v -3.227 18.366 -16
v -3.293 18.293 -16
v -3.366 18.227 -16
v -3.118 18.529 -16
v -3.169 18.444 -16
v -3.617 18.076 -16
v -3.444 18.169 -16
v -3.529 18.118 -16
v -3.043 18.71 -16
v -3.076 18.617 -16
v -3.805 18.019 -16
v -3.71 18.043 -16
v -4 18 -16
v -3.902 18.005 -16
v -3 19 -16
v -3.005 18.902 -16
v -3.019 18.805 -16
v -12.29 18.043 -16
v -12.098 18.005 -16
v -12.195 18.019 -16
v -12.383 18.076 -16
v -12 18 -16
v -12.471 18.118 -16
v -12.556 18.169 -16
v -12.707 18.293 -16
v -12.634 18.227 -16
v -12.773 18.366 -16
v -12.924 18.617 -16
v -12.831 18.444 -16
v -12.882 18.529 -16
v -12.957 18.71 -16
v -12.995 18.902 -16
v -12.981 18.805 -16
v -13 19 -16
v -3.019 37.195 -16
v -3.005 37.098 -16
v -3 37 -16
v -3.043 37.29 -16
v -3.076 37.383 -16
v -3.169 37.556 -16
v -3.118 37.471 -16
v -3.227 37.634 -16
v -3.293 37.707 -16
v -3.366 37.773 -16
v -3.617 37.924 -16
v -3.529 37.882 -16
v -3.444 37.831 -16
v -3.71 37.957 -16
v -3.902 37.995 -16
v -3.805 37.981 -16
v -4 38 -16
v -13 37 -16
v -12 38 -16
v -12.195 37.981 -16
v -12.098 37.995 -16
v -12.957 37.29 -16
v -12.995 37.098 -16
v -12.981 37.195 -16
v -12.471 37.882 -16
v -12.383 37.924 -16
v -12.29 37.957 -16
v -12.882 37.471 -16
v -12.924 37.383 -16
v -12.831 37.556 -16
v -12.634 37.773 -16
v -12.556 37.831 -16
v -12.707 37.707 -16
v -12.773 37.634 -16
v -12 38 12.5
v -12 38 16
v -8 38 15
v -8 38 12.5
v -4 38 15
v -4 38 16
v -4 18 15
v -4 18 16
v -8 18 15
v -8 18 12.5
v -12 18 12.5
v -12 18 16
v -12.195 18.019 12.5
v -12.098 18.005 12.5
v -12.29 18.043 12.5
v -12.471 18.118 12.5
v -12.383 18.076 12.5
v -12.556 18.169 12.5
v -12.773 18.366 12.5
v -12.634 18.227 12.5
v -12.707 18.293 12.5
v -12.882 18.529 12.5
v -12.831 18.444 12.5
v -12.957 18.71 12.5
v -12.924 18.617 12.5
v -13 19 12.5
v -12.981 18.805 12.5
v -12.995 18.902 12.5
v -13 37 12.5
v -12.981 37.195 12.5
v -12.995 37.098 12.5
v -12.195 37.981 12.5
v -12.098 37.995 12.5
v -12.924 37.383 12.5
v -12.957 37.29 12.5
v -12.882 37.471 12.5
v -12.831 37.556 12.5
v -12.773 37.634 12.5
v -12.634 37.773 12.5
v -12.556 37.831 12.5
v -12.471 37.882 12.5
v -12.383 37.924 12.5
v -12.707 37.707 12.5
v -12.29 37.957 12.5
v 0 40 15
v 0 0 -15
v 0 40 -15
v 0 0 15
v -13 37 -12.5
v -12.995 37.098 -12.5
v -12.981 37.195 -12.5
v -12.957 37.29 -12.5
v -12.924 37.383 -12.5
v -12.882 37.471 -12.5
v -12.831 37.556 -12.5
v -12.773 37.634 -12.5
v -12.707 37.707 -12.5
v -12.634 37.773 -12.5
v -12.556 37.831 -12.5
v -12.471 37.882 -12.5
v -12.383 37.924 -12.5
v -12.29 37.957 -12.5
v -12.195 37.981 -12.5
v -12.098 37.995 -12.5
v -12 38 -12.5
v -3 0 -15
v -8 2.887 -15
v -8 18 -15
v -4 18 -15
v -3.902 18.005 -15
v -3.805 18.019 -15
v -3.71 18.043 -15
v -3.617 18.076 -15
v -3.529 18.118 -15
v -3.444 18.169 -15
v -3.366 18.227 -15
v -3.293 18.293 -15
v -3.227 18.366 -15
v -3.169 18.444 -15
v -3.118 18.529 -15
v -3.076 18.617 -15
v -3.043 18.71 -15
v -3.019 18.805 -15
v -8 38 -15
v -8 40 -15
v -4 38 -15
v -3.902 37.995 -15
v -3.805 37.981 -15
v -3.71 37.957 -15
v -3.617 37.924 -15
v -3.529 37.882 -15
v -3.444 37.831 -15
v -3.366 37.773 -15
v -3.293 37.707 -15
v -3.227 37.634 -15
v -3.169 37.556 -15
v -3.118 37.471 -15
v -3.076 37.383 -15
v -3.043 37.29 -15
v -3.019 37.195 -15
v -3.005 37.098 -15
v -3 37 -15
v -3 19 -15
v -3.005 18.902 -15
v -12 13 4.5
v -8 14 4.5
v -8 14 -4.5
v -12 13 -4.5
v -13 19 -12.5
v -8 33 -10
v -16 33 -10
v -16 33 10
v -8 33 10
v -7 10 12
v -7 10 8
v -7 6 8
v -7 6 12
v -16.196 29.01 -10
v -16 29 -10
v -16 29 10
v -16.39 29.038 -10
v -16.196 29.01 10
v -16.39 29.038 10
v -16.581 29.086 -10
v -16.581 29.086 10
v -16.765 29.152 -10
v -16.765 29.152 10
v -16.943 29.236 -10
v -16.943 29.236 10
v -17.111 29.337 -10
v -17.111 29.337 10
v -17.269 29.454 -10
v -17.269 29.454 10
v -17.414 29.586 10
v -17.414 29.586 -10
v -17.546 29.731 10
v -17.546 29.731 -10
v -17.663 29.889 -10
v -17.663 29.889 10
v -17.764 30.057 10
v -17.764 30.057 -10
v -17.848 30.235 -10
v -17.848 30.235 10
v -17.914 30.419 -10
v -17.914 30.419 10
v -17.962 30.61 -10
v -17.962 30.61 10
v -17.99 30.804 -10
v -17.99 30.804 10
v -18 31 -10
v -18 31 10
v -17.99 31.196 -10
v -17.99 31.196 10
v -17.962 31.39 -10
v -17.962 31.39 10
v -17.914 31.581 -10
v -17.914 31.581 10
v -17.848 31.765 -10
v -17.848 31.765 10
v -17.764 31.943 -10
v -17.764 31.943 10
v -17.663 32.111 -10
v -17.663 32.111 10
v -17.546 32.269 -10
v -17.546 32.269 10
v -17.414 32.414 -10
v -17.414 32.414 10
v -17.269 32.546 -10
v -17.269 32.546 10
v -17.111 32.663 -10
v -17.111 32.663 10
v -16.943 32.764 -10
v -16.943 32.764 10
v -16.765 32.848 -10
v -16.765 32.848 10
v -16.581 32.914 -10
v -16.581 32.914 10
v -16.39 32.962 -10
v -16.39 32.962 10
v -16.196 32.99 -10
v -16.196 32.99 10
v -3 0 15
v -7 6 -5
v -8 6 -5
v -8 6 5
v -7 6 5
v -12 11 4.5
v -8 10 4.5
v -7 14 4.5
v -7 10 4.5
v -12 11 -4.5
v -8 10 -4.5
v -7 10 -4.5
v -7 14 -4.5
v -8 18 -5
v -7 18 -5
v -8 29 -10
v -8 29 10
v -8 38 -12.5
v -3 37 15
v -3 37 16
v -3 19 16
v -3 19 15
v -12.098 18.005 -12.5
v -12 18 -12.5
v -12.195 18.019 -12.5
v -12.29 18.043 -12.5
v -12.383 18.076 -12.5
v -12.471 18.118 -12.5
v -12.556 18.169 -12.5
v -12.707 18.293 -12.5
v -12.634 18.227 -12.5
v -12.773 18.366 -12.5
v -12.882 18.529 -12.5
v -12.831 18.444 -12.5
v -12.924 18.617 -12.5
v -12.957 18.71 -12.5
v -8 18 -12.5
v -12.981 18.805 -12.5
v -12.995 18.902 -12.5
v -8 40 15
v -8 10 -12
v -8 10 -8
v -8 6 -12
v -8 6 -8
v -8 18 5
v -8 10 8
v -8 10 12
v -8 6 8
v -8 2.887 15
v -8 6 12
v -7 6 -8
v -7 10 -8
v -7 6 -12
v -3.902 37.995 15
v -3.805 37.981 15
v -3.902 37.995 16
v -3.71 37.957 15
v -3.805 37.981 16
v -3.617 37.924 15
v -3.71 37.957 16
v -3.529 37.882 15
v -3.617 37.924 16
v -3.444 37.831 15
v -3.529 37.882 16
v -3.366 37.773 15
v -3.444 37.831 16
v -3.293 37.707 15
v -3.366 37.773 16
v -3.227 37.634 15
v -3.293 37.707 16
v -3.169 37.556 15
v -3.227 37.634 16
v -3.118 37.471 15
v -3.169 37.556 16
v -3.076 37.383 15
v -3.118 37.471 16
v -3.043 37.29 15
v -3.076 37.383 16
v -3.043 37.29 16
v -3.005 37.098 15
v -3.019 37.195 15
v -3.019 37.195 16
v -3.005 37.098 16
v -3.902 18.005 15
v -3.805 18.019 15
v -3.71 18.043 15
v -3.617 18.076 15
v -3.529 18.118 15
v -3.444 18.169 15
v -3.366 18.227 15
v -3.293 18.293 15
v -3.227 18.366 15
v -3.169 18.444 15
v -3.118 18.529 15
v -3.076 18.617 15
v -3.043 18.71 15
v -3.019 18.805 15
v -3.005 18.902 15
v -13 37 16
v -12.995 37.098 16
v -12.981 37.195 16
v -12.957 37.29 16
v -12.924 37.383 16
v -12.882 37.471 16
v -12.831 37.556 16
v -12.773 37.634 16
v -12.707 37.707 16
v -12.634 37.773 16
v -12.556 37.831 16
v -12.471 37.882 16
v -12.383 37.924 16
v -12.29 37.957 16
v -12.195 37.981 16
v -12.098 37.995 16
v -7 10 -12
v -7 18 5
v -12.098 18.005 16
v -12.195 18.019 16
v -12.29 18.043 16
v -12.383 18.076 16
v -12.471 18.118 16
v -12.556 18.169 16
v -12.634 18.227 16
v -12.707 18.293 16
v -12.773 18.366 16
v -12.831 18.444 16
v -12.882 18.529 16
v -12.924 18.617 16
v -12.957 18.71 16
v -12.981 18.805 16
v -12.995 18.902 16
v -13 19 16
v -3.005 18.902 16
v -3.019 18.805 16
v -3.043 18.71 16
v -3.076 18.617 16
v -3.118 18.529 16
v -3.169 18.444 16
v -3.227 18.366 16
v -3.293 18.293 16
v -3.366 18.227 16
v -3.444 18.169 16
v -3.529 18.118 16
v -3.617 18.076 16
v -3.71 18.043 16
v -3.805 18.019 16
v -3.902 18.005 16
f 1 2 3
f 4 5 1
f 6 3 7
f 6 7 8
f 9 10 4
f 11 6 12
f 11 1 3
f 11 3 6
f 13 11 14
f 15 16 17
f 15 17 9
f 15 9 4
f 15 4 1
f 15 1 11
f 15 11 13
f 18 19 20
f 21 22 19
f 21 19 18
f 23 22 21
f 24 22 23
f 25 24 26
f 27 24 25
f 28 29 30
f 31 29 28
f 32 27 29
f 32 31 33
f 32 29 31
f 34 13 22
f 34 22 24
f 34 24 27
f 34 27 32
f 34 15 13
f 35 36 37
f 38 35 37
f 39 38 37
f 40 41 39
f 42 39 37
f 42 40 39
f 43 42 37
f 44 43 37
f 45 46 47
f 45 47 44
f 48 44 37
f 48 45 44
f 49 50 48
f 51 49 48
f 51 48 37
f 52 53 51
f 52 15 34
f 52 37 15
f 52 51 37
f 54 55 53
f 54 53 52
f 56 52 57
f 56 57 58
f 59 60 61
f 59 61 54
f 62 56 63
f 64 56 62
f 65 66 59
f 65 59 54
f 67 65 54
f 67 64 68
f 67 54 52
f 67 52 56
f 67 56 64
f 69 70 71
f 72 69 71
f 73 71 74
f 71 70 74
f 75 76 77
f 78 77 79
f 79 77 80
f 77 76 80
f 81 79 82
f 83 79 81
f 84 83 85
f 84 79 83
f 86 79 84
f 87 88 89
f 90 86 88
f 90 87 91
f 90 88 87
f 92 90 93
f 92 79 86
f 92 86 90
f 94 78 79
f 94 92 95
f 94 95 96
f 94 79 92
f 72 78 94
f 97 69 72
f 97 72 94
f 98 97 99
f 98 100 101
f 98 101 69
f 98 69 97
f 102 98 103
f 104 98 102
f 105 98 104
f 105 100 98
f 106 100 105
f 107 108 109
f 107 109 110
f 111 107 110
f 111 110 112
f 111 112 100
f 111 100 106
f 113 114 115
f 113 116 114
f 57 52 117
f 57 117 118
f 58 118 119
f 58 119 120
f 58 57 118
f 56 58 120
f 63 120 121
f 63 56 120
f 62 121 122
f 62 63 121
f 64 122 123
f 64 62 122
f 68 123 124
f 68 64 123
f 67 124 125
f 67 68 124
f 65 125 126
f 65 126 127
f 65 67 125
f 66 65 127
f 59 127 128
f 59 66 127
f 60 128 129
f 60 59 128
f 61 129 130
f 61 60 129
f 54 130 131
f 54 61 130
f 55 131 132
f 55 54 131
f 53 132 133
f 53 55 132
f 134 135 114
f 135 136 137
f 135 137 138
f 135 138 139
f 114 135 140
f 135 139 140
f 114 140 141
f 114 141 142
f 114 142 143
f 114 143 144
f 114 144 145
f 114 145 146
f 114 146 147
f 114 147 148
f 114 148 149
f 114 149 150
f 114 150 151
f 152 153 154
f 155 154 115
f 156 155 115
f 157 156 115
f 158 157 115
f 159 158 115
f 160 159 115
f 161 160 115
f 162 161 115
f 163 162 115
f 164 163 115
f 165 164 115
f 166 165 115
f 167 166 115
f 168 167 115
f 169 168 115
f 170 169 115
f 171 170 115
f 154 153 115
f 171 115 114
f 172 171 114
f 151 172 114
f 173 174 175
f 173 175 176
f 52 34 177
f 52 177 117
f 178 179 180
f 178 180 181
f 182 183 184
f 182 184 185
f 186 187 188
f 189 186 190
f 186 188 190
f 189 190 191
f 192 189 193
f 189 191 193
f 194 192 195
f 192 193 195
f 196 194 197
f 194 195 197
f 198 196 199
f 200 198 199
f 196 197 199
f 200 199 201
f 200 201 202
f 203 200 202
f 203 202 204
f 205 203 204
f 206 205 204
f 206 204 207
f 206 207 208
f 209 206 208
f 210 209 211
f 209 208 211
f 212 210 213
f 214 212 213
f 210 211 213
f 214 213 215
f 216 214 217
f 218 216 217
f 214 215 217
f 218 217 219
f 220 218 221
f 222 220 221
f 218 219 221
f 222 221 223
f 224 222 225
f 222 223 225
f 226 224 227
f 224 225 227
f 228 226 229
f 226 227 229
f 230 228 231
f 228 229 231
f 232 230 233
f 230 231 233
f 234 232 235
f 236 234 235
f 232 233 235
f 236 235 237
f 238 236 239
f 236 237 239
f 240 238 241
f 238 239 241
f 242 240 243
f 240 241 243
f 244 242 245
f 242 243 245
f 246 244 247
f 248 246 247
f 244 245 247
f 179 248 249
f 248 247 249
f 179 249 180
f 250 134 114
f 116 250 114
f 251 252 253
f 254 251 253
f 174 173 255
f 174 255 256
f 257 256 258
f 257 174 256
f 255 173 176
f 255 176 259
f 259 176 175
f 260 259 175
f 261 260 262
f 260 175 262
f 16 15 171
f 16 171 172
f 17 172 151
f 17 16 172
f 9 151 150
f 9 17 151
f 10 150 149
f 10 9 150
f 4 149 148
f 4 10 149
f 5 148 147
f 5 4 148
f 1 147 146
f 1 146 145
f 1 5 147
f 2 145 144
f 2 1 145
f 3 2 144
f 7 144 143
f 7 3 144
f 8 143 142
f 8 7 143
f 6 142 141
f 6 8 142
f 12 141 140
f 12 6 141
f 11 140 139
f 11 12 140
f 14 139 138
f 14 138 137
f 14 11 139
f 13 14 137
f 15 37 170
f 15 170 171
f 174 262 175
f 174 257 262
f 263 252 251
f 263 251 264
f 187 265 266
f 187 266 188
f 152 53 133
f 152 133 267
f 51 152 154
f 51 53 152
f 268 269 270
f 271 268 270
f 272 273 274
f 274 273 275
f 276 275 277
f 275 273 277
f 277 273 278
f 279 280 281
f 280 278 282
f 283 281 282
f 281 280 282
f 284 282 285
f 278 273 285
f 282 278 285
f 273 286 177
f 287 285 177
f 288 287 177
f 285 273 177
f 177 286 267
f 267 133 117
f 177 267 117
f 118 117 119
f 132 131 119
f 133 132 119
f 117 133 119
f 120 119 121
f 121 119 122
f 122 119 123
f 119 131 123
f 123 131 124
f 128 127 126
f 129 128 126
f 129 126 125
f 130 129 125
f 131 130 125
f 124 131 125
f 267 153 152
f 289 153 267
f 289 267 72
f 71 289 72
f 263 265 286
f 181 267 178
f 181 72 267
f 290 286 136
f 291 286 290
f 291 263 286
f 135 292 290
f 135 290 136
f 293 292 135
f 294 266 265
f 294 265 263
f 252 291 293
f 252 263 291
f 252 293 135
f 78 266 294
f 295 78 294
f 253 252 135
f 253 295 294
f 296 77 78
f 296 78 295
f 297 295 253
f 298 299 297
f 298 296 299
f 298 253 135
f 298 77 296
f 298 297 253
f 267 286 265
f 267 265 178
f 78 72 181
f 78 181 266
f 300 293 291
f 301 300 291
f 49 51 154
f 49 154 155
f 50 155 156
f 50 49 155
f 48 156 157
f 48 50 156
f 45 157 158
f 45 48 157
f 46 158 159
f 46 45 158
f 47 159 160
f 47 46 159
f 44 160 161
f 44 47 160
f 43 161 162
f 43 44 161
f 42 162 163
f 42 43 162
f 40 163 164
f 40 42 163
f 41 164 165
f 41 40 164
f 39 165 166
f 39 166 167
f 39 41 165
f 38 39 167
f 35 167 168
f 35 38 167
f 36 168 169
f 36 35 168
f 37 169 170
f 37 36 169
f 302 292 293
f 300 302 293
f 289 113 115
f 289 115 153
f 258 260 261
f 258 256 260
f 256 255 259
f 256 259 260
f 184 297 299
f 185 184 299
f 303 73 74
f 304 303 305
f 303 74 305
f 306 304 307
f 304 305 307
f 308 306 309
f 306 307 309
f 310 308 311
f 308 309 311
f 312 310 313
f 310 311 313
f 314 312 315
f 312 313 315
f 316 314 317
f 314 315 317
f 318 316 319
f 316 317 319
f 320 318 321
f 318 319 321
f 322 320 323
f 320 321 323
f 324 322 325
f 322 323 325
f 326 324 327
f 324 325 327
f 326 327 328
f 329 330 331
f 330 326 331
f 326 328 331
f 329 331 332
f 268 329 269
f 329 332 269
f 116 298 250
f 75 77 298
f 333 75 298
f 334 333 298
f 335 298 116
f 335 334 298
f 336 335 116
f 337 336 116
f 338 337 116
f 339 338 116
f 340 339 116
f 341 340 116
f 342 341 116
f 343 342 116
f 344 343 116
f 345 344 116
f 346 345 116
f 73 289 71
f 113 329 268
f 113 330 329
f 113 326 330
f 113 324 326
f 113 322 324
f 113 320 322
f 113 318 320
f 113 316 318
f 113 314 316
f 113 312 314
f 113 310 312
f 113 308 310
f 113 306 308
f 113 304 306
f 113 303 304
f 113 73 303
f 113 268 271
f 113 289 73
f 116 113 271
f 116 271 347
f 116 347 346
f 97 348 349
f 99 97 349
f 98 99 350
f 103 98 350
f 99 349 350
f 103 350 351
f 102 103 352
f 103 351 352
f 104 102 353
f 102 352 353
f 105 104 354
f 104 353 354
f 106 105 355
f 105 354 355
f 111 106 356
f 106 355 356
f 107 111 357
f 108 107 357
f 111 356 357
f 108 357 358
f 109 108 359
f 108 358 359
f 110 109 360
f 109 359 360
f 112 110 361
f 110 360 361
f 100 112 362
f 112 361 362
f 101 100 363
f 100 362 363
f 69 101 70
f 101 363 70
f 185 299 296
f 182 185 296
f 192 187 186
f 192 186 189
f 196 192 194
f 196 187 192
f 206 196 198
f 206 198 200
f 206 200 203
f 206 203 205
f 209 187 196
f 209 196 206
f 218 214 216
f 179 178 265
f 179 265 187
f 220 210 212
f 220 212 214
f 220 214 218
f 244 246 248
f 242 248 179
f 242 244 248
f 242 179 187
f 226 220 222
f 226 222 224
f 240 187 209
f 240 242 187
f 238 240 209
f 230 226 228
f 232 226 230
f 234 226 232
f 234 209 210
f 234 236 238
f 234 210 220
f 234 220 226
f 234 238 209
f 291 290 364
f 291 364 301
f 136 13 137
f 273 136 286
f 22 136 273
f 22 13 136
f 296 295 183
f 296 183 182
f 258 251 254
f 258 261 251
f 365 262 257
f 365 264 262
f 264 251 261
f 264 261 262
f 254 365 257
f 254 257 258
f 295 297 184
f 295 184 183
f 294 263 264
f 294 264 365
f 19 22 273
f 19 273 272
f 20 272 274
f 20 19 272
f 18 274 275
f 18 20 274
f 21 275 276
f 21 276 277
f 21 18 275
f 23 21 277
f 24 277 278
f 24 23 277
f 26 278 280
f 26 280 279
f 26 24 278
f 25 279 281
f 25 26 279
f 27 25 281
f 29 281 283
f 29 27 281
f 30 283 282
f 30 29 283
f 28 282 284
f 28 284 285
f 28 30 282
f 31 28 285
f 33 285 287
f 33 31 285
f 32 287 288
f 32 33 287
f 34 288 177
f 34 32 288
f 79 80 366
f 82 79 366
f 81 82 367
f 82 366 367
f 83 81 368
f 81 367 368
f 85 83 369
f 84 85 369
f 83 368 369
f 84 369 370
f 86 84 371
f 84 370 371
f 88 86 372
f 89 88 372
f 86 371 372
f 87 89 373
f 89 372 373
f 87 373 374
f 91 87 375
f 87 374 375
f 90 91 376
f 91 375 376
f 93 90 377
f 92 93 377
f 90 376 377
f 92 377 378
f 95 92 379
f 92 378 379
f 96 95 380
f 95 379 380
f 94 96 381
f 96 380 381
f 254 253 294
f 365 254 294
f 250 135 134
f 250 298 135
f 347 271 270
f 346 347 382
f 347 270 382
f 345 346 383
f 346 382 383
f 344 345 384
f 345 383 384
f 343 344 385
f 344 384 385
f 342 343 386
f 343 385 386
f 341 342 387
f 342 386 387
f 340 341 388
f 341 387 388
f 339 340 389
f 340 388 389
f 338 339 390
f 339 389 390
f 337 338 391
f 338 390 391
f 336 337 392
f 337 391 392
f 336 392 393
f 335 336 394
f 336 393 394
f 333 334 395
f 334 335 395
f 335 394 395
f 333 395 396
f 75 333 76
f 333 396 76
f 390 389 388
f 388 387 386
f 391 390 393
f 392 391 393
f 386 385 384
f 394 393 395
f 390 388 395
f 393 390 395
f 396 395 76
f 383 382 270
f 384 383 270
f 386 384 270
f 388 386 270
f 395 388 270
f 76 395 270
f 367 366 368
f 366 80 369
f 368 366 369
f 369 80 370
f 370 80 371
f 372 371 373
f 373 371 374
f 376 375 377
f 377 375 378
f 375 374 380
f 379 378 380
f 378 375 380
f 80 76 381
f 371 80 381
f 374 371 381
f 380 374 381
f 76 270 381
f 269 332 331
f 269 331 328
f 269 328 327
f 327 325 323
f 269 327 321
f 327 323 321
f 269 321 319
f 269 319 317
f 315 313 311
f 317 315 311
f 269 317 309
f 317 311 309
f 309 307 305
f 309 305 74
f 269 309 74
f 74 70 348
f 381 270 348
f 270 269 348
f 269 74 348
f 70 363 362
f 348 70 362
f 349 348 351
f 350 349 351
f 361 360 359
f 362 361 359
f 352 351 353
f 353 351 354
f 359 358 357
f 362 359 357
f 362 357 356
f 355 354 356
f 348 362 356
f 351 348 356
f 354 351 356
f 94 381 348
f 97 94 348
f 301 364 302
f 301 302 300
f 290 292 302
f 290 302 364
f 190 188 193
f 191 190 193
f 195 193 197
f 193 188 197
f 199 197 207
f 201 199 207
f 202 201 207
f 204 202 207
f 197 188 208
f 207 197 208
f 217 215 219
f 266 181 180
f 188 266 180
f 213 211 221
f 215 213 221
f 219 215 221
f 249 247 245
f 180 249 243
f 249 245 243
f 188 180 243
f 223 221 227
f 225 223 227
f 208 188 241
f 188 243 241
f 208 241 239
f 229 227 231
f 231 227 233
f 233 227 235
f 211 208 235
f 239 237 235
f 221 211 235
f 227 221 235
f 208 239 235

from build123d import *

# Parameters (mm, degrees)
EXTRUDE_1_DEPTH     = 15
SKETCH_7_W          = 10
SKETCH_7_H          = 12
SKETCH_7_W_2        = 4
SKETCH_7_H_2        = 4
CUT_EXTRUDE_1_DEPTH = 1
EXTRUDE_2_DEPTH     = 4.5
EXTRUDE_3_DEPTH     = 10
EXTRUDE_START       = 1
EXTRUDE_4_DEPTH     = 3.5


with BuildPart() as part:
    # 草图1 → 凸台-拉伸1 (new, symmetric)
    with BuildSketch(Plane.XY):
        Polygon((0, 0), (0, 40), (-8, 40), (-8, 2.886751346), (-3, 0), align=None)
    extrude(amount=EXTRUDE_1_DEPTH, both=True)

    # 草图7 → 切除-拉伸1 (cut)
    with BuildSketch(Plane.ZY.offset(8)):
        with Locations((0, 12)):
            Rectangle(SKETCH_7_W, SKETCH_7_H)
        with Locations((-10, 8)):
            Rectangle(SKETCH_7_W_2, SKETCH_7_H_2)
        with Locations((10, 8)):
            Rectangle(SKETCH_7_W_2, SKETCH_7_H_2)
    extrude(amount=-CUT_EXTRUDE_1_DEPTH, mode=Mode.SUBTRACT)

    # 草图9 → 凸台-拉伸2 (add, symmetric)
    with BuildSketch(Plane.XY):
        Polygon((-7, 14), (-8, 14), (-12, 13), (-12, 11), (-8, 10), (-7, 10), align=None)
    extrude(amount=EXTRUDE_2_DEPTH, both=True)

    # 草图15 → 凸台-拉伸3 (add, symmetric)
    with BuildSketch(Plane.XY):
        with BuildLine():
            Line((-8, 29), (-16, 29))
            ThreePointArc((-16, 29), (-18, 31), (-16, 33))
            Line((-16, 33), (-8, 33))
            ThreePointArc((-8, 33), (-6, 31), (-8, 29))
        make_face()
    extrude(amount=EXTRUDE_3_DEPTH, both=True)

    # 草图16 → 凸台-拉伸4 (add)
    with BuildSketch(Plane.XY.offset(15).offset(EXTRUDE_START)):
        with BuildLine():
            Line((-4, 18), (-12, 18))
            ThreePointArc((-12, 18), (-12.707106781, 18.292893219), (-13, 19))
            Line((-13, 19), (-13, 37))
            ThreePointArc((-13, 37), (-12.707106781, 37.707106781), (-12, 38))
            Line((-12, 38), (-4, 38))
            ThreePointArc((-4, 38), (-3.292893219, 37.707106781), (-3, 37))
            Line((-3, 37), (-3, 19))
            ThreePointArc((-3, 19), (-3.292893219, 18.292893219), (-4, 18))
        make_face()
    extrude_4 = extrude(amount=-EXTRUDE_4_DEPTH)

    # 镜向1: 凸台-拉伸4 across plane
    add(extrude_4.mirror(Plane.XY))


solid = part.part
